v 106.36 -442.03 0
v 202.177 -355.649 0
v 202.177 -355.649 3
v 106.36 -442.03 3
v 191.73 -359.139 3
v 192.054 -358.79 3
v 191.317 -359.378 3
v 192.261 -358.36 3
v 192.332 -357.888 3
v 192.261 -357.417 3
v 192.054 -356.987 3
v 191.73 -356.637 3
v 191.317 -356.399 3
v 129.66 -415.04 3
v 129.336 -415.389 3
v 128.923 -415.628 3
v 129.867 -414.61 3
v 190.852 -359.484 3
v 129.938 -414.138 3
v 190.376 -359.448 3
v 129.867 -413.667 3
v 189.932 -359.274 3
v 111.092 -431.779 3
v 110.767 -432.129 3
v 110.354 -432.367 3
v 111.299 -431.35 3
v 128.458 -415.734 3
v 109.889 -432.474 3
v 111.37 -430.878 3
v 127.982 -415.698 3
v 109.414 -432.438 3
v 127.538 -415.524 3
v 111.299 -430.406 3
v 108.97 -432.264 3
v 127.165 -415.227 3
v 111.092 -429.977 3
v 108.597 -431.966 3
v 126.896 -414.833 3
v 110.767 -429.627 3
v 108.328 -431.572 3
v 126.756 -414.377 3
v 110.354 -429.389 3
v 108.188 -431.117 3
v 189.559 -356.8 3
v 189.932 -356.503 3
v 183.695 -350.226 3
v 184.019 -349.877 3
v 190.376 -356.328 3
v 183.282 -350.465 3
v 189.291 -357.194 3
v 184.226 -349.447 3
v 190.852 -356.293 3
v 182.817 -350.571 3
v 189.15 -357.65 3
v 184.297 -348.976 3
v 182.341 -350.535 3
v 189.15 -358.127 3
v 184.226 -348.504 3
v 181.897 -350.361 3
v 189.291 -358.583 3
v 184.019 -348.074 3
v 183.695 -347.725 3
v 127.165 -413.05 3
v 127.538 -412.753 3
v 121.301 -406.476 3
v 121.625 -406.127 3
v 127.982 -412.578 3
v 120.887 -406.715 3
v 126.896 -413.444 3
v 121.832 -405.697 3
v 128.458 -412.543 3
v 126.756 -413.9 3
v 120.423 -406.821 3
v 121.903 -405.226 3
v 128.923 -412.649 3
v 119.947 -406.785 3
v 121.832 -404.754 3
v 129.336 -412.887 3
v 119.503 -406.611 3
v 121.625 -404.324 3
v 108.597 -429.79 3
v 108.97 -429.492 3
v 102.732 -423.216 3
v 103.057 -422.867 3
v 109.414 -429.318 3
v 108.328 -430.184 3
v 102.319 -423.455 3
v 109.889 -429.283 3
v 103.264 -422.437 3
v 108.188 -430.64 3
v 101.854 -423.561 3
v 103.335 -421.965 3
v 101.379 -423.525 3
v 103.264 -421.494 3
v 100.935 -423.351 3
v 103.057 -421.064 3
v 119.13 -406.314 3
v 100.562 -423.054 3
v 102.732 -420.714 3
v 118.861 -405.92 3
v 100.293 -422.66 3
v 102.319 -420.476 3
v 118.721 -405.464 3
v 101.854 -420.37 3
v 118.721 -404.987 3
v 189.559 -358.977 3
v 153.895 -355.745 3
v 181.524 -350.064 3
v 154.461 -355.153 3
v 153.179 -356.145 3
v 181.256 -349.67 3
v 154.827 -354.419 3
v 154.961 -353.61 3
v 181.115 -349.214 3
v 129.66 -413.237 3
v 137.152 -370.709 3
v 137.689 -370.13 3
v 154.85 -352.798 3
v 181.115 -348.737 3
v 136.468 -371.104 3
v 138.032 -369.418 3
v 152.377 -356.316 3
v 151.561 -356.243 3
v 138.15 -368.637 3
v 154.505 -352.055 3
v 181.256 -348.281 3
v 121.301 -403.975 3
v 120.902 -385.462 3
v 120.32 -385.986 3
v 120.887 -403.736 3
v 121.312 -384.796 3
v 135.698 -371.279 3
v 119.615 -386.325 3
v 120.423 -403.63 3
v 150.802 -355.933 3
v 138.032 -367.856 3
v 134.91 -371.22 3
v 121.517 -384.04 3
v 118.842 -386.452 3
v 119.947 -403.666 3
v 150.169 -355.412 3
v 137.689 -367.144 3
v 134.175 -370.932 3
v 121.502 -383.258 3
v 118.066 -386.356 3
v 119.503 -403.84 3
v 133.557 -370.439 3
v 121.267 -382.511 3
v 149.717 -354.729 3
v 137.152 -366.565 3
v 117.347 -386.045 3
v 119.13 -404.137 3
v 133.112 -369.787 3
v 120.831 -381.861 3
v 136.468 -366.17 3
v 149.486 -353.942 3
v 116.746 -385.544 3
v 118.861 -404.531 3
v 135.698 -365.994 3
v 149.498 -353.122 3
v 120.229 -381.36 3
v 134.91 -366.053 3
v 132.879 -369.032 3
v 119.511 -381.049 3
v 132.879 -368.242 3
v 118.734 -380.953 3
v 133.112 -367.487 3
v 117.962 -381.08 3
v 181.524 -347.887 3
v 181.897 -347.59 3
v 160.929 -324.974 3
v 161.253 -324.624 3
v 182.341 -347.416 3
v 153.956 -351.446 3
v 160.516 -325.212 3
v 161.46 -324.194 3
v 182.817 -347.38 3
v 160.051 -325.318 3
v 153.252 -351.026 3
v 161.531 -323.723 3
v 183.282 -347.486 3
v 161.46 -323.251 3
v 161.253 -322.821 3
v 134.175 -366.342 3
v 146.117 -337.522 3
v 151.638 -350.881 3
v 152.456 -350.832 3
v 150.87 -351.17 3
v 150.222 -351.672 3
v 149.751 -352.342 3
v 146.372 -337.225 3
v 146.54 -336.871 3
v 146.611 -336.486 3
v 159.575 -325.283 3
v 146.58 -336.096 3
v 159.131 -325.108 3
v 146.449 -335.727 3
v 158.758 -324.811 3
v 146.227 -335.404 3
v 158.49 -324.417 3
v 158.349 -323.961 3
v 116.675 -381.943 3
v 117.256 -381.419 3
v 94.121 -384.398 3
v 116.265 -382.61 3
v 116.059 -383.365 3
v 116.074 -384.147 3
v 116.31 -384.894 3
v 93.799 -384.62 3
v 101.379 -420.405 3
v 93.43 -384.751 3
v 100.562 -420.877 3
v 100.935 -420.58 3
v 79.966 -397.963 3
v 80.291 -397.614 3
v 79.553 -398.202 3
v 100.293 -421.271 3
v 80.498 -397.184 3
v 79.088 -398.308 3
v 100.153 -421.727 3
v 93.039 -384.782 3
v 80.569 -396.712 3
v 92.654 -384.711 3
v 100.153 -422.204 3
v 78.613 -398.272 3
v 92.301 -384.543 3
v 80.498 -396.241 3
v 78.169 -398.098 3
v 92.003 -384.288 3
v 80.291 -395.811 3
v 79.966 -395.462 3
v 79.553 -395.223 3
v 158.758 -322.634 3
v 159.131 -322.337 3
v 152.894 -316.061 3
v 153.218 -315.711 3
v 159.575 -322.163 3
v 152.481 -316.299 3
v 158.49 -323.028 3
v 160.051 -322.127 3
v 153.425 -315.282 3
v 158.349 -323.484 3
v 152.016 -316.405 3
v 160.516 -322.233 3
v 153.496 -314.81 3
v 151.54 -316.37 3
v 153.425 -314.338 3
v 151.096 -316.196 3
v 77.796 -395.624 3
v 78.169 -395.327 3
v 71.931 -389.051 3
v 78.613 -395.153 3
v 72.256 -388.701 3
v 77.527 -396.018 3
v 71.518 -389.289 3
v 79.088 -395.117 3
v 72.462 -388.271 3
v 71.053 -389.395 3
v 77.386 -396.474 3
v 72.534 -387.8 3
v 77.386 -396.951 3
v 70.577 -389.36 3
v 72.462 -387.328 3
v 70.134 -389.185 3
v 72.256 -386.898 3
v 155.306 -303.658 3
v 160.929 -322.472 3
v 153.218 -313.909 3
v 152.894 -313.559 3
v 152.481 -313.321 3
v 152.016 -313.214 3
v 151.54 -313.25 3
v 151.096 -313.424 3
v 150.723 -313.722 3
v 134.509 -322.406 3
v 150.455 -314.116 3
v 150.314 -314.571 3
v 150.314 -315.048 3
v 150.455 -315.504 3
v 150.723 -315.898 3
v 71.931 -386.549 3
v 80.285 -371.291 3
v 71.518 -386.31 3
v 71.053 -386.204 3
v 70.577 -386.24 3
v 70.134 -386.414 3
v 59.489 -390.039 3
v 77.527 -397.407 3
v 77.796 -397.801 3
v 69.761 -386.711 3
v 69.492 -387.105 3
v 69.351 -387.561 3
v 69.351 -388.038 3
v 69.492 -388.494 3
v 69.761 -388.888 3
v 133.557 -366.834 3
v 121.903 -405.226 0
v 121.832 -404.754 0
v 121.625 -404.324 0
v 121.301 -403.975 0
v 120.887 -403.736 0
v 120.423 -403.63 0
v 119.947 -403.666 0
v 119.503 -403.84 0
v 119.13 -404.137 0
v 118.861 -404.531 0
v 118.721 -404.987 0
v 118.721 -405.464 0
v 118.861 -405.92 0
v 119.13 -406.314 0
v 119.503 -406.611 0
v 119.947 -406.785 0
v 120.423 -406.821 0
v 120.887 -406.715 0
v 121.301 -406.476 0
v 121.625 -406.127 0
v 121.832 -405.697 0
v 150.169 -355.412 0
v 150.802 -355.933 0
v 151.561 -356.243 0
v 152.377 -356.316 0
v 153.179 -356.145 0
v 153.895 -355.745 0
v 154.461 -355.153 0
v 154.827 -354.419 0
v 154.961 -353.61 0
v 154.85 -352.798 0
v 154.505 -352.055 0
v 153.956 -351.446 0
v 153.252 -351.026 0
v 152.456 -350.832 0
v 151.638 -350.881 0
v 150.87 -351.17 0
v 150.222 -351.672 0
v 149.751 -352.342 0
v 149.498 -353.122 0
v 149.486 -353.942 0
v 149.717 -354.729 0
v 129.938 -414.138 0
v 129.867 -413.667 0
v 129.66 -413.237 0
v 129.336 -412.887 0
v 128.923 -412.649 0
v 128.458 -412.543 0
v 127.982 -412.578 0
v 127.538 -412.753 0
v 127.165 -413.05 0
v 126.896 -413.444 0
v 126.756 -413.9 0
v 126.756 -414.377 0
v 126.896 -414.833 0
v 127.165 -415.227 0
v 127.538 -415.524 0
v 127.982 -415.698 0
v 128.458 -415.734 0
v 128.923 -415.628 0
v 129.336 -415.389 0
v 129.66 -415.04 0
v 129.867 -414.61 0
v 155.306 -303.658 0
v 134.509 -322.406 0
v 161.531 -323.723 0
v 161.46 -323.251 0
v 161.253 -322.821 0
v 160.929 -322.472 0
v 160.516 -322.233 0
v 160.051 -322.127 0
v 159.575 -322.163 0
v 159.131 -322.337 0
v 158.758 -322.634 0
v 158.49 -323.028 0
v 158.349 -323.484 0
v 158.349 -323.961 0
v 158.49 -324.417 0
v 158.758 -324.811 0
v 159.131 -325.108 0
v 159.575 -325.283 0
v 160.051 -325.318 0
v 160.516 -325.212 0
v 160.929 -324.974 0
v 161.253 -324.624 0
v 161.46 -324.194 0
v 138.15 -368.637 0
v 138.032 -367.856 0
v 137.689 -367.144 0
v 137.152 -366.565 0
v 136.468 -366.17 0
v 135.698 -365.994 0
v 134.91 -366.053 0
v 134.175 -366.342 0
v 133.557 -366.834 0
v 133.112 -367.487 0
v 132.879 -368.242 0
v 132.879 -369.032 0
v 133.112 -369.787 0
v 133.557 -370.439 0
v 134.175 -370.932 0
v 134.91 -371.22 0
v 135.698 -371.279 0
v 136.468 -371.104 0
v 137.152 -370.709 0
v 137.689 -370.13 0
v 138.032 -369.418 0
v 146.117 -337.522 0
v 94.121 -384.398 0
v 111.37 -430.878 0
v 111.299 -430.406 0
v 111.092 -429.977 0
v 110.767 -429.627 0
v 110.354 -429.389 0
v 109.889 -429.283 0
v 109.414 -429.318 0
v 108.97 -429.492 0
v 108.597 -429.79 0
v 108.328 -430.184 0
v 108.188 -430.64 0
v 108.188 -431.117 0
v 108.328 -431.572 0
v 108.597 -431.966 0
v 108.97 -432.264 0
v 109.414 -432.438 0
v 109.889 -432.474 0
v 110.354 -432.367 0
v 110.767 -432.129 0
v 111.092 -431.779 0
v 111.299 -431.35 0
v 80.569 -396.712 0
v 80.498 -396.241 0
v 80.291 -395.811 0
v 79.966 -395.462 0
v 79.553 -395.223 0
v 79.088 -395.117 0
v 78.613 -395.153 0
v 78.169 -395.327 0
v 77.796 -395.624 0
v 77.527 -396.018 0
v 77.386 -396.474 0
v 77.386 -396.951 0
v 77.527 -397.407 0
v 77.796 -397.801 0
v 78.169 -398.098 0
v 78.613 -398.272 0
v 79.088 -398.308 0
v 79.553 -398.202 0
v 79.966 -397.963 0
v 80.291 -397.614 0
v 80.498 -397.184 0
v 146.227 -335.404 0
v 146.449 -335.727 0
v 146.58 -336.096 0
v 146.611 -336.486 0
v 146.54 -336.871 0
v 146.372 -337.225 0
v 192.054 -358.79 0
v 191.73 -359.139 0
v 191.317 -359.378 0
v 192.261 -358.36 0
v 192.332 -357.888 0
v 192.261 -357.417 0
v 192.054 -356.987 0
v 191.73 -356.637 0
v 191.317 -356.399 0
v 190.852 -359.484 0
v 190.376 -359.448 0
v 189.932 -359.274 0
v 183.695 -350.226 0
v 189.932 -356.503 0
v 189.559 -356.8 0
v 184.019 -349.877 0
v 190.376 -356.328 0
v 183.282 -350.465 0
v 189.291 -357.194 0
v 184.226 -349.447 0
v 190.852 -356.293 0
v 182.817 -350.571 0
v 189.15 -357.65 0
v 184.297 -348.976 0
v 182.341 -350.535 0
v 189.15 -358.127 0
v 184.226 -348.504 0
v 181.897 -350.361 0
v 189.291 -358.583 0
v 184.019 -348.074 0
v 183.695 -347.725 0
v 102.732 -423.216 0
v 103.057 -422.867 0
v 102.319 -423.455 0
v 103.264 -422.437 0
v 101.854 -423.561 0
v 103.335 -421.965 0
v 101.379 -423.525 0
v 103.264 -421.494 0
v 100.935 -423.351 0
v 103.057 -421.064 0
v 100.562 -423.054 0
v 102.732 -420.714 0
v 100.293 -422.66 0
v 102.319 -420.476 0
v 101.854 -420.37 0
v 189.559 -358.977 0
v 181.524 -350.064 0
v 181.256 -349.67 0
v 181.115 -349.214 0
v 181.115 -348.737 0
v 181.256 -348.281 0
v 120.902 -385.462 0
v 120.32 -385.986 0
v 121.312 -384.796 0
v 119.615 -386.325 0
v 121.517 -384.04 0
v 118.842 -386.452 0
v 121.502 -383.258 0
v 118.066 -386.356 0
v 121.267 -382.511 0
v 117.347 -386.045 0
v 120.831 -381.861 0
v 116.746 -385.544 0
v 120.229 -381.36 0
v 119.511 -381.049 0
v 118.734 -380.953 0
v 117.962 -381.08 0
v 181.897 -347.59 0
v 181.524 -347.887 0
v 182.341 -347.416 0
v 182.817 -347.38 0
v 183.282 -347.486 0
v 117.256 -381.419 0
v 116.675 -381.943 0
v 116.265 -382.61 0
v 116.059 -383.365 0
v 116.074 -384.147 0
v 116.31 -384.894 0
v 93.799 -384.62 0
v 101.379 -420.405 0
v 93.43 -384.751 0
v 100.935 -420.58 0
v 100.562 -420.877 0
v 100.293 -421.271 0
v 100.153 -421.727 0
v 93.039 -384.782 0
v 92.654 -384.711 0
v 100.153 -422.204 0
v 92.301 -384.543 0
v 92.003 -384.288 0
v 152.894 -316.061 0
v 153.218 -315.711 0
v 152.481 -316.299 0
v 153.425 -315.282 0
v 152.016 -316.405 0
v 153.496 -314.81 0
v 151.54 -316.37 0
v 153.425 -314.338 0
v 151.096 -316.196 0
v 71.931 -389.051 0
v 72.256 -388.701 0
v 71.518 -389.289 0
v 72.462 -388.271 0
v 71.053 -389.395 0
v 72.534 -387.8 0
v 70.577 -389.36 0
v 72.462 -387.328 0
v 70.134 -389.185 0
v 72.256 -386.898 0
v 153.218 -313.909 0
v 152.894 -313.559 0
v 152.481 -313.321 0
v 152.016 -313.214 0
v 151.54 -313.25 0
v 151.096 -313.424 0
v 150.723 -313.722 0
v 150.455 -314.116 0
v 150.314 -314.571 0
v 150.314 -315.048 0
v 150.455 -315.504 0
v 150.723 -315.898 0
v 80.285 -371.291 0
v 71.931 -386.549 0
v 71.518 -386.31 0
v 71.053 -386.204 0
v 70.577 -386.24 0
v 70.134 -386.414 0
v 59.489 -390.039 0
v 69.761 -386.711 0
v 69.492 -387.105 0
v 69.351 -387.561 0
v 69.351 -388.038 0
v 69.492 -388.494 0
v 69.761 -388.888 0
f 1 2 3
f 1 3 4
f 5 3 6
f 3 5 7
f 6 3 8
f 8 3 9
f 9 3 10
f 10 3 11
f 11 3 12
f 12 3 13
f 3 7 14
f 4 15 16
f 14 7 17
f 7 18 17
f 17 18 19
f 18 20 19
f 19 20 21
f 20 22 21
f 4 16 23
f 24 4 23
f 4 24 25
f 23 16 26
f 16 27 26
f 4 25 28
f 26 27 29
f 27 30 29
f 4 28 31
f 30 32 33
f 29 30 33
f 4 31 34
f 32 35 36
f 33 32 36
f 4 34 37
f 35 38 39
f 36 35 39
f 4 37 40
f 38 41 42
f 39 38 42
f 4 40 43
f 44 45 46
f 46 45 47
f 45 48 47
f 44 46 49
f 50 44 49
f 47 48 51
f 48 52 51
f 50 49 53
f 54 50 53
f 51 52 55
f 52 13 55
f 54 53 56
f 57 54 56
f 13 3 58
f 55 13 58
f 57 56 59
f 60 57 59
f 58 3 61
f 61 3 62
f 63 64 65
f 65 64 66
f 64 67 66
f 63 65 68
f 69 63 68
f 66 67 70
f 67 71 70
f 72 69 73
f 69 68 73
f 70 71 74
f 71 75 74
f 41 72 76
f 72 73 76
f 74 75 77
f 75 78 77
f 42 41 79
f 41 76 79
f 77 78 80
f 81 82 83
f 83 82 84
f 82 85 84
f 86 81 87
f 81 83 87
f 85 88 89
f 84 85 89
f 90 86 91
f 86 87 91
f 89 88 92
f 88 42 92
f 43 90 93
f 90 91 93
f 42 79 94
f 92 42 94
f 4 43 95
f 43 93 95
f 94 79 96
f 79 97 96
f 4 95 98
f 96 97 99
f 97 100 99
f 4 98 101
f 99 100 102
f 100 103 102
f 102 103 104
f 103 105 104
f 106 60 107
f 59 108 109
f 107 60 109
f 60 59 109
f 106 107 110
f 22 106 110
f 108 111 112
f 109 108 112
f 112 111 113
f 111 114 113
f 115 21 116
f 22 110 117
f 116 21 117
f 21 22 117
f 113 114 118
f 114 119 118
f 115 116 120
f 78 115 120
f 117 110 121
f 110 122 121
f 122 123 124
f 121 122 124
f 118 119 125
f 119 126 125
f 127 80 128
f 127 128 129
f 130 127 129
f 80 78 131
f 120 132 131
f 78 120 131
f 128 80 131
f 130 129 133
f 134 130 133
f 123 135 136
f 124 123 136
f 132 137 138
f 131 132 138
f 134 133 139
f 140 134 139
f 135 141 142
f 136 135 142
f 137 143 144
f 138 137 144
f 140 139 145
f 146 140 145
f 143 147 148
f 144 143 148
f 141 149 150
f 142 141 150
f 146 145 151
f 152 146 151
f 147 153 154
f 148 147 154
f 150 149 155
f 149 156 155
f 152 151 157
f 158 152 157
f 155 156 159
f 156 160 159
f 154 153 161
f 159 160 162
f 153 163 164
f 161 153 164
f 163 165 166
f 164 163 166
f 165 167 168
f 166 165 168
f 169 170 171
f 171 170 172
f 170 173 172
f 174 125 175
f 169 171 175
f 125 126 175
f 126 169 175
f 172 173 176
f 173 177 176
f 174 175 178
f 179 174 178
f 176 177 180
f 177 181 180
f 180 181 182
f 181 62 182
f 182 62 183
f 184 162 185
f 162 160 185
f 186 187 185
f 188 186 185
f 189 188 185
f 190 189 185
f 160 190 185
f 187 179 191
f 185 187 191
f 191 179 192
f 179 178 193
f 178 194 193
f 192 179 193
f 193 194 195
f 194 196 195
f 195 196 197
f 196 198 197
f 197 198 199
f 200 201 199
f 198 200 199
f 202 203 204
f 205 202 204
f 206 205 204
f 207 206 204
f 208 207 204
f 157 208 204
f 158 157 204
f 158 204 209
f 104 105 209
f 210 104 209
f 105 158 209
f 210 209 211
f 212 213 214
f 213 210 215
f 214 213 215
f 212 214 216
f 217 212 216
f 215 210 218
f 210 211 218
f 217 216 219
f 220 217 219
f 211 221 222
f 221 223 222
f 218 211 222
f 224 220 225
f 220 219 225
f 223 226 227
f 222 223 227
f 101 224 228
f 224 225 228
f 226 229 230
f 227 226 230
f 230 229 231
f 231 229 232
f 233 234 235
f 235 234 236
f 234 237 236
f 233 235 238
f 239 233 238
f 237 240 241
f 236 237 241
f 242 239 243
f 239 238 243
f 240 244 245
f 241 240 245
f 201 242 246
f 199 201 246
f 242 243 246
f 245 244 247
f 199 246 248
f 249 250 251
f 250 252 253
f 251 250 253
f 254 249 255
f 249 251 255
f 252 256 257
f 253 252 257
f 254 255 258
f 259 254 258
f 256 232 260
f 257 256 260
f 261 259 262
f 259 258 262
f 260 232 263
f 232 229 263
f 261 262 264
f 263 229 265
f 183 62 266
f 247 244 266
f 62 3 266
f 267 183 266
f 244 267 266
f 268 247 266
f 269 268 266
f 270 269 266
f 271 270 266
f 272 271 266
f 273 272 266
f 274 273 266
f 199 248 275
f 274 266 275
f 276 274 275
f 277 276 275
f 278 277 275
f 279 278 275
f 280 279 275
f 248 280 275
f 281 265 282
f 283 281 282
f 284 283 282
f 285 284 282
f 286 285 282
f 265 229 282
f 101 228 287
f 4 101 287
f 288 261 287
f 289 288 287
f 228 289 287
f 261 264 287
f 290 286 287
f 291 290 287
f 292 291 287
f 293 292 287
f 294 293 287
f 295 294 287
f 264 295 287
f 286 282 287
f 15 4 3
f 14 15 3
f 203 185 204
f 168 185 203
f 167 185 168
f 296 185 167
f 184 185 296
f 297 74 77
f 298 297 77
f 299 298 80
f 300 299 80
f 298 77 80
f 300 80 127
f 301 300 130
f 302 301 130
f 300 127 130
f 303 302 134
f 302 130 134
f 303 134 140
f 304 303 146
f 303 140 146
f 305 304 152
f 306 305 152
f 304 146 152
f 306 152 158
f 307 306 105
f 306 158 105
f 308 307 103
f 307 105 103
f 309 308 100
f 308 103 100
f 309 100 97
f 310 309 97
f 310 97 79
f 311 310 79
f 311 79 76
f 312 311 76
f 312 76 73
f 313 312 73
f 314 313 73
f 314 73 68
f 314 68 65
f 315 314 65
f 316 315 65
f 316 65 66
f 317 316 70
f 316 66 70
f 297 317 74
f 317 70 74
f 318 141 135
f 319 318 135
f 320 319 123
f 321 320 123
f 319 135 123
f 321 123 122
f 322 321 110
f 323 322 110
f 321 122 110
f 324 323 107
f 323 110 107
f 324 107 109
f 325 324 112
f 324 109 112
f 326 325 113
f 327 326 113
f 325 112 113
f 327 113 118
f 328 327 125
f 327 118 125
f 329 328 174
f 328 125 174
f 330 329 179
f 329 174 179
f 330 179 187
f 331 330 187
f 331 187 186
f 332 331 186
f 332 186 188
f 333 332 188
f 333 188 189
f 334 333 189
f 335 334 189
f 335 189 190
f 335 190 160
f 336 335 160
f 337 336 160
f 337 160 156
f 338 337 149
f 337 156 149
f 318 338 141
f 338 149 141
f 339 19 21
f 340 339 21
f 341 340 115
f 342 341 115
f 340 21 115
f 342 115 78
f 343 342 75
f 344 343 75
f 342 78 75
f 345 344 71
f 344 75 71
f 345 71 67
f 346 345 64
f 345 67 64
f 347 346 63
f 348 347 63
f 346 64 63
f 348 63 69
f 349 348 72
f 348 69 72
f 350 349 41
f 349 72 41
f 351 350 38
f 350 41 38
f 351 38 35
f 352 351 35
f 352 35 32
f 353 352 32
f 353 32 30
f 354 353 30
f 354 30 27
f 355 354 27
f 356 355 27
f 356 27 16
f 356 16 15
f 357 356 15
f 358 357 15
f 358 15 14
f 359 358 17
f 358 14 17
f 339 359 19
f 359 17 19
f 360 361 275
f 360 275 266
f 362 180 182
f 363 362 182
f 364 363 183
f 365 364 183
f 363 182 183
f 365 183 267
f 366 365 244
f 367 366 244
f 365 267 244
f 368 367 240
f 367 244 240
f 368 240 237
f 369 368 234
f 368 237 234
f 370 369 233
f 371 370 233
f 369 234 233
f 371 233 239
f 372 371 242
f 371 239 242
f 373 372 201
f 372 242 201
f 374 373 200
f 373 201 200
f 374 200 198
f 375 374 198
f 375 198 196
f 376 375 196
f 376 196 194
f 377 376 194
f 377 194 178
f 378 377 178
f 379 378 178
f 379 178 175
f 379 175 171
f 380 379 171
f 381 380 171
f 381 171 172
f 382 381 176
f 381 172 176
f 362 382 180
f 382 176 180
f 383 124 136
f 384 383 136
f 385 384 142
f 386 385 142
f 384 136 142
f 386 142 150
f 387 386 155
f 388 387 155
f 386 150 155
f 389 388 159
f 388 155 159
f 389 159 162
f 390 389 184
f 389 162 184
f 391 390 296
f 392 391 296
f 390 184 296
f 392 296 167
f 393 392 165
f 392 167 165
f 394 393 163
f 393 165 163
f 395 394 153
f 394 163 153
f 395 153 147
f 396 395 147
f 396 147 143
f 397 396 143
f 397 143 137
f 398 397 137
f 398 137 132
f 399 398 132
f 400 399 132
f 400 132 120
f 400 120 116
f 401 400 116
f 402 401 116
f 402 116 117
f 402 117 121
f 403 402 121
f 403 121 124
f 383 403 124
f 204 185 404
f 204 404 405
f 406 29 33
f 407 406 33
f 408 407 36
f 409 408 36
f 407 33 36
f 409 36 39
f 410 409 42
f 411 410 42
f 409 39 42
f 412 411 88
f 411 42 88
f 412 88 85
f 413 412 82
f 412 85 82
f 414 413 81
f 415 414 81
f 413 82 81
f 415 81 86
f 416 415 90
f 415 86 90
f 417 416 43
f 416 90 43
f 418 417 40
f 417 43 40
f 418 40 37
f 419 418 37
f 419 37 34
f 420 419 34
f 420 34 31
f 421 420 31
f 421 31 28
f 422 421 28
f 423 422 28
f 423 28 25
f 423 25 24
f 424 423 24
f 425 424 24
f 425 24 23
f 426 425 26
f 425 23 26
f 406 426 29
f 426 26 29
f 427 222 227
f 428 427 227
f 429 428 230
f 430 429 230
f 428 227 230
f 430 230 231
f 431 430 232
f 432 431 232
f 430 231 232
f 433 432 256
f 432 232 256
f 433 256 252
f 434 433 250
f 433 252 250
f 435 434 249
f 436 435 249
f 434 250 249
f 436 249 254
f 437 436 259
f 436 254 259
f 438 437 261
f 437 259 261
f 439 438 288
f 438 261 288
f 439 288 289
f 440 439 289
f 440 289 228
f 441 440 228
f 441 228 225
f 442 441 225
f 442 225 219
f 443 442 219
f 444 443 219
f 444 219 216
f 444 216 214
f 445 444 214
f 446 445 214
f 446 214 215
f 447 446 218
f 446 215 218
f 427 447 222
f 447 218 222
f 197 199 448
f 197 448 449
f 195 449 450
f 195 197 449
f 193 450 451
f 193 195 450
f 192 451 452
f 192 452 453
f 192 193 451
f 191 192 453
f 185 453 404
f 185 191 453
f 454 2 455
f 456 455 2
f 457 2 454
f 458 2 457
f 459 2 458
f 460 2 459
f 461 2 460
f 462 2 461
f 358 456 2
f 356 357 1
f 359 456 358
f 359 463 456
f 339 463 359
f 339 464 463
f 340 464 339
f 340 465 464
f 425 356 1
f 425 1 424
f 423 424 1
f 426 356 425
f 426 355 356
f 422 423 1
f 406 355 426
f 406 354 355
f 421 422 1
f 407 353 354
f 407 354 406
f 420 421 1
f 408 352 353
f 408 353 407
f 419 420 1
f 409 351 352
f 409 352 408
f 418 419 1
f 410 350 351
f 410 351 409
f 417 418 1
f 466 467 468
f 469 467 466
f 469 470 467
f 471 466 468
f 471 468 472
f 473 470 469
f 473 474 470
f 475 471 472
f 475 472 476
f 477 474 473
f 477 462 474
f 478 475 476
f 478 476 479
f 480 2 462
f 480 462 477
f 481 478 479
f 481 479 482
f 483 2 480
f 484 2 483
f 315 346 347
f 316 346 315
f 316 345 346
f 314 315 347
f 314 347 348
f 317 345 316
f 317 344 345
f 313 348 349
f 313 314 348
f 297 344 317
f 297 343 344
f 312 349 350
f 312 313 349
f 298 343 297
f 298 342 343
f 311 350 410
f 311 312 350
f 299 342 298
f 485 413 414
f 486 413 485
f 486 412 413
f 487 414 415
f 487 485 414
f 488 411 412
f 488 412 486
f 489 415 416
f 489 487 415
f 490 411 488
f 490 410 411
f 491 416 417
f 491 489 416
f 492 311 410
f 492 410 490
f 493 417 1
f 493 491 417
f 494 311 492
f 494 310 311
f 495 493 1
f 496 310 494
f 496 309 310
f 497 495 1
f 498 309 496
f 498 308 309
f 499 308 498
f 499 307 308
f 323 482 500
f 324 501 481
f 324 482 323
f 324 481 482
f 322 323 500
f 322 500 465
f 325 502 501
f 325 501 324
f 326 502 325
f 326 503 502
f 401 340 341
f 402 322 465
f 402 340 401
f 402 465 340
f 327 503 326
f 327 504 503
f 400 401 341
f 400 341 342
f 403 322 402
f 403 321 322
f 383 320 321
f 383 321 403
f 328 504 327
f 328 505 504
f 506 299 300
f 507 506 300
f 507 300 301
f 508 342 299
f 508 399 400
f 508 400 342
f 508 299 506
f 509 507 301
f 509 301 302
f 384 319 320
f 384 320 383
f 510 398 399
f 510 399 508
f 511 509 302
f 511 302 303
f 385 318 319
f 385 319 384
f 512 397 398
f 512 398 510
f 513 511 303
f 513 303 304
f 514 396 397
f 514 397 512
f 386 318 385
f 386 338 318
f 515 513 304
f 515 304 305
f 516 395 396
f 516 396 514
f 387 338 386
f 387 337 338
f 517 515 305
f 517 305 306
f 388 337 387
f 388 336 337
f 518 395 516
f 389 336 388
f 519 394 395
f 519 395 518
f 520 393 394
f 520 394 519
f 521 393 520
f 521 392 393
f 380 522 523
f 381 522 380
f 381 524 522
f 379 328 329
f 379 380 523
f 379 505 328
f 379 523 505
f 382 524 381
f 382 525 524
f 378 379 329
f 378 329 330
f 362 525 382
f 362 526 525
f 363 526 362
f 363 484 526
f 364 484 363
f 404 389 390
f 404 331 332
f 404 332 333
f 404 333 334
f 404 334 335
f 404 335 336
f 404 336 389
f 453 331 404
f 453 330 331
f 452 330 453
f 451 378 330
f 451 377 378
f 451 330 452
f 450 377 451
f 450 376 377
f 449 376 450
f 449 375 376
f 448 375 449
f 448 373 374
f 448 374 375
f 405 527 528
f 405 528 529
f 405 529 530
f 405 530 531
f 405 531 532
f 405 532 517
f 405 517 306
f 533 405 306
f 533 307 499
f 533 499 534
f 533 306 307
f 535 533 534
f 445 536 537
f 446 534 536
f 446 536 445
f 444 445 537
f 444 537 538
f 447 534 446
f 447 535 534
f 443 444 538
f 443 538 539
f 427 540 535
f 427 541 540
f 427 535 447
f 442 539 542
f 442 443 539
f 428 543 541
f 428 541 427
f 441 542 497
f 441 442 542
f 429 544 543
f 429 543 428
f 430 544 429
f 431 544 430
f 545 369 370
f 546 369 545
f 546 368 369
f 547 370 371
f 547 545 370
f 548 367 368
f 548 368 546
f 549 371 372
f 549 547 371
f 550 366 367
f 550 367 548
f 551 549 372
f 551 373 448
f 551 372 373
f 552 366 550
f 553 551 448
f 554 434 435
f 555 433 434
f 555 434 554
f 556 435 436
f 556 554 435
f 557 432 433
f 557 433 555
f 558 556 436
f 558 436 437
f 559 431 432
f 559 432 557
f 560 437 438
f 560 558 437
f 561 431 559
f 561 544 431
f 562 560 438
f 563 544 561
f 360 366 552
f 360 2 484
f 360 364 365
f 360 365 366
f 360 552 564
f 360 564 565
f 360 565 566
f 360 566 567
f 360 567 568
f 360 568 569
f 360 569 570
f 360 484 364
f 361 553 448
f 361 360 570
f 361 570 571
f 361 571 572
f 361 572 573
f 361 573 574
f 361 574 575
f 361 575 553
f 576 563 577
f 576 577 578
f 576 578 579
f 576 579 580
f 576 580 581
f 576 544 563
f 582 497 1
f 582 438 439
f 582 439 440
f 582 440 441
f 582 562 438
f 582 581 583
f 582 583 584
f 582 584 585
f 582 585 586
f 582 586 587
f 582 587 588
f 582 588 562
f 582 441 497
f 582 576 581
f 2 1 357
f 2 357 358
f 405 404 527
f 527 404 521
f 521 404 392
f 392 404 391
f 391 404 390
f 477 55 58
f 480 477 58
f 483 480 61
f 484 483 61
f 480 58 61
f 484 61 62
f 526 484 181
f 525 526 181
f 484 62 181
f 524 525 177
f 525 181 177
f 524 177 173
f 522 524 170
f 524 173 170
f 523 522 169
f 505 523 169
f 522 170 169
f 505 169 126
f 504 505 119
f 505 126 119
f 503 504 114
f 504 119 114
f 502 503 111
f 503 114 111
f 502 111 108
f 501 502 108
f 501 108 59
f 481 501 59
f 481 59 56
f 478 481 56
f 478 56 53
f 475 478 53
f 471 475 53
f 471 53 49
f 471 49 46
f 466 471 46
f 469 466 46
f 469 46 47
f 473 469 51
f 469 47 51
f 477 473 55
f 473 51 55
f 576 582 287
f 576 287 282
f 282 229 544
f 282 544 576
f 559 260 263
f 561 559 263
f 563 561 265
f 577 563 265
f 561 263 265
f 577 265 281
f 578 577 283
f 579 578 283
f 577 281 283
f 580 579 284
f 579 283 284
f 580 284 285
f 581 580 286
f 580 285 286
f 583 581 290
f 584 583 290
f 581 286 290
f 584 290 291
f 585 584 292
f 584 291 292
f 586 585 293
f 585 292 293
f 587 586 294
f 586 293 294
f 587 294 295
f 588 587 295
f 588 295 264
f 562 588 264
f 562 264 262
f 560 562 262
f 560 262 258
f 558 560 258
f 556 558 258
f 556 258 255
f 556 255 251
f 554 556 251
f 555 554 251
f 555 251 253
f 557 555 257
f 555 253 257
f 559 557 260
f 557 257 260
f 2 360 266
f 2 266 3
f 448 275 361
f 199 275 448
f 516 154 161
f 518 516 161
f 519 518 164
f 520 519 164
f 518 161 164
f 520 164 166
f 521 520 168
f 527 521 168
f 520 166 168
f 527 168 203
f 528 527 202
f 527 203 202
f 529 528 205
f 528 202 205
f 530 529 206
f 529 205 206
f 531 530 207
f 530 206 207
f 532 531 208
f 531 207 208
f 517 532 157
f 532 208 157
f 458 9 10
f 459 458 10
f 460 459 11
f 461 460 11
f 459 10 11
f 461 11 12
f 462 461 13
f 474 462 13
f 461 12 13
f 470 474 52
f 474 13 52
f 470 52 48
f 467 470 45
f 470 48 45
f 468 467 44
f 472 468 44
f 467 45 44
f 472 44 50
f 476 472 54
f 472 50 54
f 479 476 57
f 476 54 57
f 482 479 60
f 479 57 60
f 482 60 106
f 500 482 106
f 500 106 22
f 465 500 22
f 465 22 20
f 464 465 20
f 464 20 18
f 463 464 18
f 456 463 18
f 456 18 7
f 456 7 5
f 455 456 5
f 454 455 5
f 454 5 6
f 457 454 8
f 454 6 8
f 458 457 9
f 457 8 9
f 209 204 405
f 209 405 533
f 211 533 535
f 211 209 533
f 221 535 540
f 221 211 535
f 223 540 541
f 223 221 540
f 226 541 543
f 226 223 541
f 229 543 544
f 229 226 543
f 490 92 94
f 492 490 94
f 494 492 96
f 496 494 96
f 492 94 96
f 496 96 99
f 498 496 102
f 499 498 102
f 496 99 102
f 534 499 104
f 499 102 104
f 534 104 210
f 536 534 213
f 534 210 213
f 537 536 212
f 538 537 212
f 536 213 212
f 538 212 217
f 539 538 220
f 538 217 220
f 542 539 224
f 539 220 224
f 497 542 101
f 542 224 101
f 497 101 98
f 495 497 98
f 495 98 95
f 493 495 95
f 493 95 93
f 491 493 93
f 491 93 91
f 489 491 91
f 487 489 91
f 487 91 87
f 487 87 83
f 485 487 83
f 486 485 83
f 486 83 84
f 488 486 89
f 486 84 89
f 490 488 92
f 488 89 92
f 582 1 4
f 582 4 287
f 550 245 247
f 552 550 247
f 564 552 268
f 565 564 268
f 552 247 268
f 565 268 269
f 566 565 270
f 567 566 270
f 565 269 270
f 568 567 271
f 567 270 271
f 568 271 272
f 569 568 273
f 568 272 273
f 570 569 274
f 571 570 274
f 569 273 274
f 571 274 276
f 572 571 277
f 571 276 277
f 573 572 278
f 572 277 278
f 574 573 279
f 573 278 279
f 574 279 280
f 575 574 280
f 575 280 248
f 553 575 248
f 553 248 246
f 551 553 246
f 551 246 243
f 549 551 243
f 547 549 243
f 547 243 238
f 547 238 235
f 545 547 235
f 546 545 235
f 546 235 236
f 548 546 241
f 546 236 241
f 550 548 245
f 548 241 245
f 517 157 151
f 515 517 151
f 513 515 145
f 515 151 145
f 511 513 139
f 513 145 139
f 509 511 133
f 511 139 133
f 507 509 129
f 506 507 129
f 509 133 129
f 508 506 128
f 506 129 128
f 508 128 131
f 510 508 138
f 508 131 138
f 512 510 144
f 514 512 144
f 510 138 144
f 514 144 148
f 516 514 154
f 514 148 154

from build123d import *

# Parameters (mm, degrees)
EXTRUDE1_DEPTH     = 3
SKETCH2_R          = 2.65
CUT_EXTRUDE1_DEPTH = 5
SKETCH4_R          = 1.6
CUT_EXTRUDE3_DEPTH = 3


with BuildPart() as part:
    # Sketch1 → Extrude1 (new body)
    with BuildSketch(Plane.XY):
        Polygon((155.305831868, -303.657635717), (202.177156078, -355.648778874), (106.360004666, -442.030352657), (59.488680456, -390.0392095), align=None)
    extrude(amount=EXTRUDE1_DEPTH)

    # Sketch2 → Cut-Extrude1 (cut)
    with BuildSketch(Plane.XY.offset(3)):
        with Locations((135.499717478, -368.636757231)):
            Circle(SKETCH2_R)
    extrude(amount=-CUT_EXTRUDE1_DEPTH, mode=Mode.SUBTRACT)

    # Sketch4 → Cut-Extrude3 (cut)
    with BuildSketch(Plane.XY.offset(3)):
        with Locations((151.896067778, -314.809922875)):
            Circle(SKETCH4_R)
        with Locations((159.931151928, -323.722690273)):
            Circle(SKETCH4_R)
        with Locations((182.697223687, -348.975531235)):
            Circle(SKETCH4_R)
        with Locations((190.732307837, -357.888298634)):
            Circle(SKETCH4_R)
        with Locations((70.933528696, -387.79968974)):
            Circle(SKETCH4_R)
        with Locations((78.968612847, -396.712457139)):
            Circle(SKETCH4_R)
        with Locations((120.302950019, -405.225539455)):
            Circle(SKETCH4_R)
        with Locations((128.338034169, -414.138306853)):
            Circle(SKETCH4_R)
        with Locations((101.734684606, -421.965298101)):
            Circle(SKETCH4_R)
        with Locations((109.769768756, -430.878065499)):
            Circle(SKETCH4_R)
        with BuildLine():
            Line((80.285137719, -371.290679816), (134.509374605, -322.406165401))
            Line((134.509374605, -322.406165401), (146.227205658, -335.40395119))
            ThreePointArc((146.227205658, -335.40395119), (146.611102327, -336.485913681), (146.117495252, -337.522432634))
            Line((146.117495252, -337.522432634), (94.121450215, -384.398176011))
            ThreePointArc((94.121450215, -384.398176011), (93.039487724, -384.782072681), (92.002968771, -384.288465605))
            Line((92.002968771, -384.288465605), (80.285137719, -371.290679816))
        make_face()
        with BuildLine():
            ThreePointArc((154.253665546, -351.729600998), (150.369782899, -351.528465254), (150.168647155, -355.412347901))
            ThreePointArc((150.168647155, -355.412347901), (154.052529802, -355.613483645), (154.253665546, -351.729600998))
        make_face()
        with BuildLine():
            ThreePointArc((120.830787802, -381.861166562), (116.946905155, -381.660030818), (116.745769411, -385.543913464))
            ThreePointArc((116.745769411, -385.543913464), (120.629652058, -385.745049208), (120.830787802, -381.861166562))
        make_face()
    extrude(amount=-CUT_EXTRUDE3_DEPTH, mode=Mode.SUBTRACT)


solid = part.part
